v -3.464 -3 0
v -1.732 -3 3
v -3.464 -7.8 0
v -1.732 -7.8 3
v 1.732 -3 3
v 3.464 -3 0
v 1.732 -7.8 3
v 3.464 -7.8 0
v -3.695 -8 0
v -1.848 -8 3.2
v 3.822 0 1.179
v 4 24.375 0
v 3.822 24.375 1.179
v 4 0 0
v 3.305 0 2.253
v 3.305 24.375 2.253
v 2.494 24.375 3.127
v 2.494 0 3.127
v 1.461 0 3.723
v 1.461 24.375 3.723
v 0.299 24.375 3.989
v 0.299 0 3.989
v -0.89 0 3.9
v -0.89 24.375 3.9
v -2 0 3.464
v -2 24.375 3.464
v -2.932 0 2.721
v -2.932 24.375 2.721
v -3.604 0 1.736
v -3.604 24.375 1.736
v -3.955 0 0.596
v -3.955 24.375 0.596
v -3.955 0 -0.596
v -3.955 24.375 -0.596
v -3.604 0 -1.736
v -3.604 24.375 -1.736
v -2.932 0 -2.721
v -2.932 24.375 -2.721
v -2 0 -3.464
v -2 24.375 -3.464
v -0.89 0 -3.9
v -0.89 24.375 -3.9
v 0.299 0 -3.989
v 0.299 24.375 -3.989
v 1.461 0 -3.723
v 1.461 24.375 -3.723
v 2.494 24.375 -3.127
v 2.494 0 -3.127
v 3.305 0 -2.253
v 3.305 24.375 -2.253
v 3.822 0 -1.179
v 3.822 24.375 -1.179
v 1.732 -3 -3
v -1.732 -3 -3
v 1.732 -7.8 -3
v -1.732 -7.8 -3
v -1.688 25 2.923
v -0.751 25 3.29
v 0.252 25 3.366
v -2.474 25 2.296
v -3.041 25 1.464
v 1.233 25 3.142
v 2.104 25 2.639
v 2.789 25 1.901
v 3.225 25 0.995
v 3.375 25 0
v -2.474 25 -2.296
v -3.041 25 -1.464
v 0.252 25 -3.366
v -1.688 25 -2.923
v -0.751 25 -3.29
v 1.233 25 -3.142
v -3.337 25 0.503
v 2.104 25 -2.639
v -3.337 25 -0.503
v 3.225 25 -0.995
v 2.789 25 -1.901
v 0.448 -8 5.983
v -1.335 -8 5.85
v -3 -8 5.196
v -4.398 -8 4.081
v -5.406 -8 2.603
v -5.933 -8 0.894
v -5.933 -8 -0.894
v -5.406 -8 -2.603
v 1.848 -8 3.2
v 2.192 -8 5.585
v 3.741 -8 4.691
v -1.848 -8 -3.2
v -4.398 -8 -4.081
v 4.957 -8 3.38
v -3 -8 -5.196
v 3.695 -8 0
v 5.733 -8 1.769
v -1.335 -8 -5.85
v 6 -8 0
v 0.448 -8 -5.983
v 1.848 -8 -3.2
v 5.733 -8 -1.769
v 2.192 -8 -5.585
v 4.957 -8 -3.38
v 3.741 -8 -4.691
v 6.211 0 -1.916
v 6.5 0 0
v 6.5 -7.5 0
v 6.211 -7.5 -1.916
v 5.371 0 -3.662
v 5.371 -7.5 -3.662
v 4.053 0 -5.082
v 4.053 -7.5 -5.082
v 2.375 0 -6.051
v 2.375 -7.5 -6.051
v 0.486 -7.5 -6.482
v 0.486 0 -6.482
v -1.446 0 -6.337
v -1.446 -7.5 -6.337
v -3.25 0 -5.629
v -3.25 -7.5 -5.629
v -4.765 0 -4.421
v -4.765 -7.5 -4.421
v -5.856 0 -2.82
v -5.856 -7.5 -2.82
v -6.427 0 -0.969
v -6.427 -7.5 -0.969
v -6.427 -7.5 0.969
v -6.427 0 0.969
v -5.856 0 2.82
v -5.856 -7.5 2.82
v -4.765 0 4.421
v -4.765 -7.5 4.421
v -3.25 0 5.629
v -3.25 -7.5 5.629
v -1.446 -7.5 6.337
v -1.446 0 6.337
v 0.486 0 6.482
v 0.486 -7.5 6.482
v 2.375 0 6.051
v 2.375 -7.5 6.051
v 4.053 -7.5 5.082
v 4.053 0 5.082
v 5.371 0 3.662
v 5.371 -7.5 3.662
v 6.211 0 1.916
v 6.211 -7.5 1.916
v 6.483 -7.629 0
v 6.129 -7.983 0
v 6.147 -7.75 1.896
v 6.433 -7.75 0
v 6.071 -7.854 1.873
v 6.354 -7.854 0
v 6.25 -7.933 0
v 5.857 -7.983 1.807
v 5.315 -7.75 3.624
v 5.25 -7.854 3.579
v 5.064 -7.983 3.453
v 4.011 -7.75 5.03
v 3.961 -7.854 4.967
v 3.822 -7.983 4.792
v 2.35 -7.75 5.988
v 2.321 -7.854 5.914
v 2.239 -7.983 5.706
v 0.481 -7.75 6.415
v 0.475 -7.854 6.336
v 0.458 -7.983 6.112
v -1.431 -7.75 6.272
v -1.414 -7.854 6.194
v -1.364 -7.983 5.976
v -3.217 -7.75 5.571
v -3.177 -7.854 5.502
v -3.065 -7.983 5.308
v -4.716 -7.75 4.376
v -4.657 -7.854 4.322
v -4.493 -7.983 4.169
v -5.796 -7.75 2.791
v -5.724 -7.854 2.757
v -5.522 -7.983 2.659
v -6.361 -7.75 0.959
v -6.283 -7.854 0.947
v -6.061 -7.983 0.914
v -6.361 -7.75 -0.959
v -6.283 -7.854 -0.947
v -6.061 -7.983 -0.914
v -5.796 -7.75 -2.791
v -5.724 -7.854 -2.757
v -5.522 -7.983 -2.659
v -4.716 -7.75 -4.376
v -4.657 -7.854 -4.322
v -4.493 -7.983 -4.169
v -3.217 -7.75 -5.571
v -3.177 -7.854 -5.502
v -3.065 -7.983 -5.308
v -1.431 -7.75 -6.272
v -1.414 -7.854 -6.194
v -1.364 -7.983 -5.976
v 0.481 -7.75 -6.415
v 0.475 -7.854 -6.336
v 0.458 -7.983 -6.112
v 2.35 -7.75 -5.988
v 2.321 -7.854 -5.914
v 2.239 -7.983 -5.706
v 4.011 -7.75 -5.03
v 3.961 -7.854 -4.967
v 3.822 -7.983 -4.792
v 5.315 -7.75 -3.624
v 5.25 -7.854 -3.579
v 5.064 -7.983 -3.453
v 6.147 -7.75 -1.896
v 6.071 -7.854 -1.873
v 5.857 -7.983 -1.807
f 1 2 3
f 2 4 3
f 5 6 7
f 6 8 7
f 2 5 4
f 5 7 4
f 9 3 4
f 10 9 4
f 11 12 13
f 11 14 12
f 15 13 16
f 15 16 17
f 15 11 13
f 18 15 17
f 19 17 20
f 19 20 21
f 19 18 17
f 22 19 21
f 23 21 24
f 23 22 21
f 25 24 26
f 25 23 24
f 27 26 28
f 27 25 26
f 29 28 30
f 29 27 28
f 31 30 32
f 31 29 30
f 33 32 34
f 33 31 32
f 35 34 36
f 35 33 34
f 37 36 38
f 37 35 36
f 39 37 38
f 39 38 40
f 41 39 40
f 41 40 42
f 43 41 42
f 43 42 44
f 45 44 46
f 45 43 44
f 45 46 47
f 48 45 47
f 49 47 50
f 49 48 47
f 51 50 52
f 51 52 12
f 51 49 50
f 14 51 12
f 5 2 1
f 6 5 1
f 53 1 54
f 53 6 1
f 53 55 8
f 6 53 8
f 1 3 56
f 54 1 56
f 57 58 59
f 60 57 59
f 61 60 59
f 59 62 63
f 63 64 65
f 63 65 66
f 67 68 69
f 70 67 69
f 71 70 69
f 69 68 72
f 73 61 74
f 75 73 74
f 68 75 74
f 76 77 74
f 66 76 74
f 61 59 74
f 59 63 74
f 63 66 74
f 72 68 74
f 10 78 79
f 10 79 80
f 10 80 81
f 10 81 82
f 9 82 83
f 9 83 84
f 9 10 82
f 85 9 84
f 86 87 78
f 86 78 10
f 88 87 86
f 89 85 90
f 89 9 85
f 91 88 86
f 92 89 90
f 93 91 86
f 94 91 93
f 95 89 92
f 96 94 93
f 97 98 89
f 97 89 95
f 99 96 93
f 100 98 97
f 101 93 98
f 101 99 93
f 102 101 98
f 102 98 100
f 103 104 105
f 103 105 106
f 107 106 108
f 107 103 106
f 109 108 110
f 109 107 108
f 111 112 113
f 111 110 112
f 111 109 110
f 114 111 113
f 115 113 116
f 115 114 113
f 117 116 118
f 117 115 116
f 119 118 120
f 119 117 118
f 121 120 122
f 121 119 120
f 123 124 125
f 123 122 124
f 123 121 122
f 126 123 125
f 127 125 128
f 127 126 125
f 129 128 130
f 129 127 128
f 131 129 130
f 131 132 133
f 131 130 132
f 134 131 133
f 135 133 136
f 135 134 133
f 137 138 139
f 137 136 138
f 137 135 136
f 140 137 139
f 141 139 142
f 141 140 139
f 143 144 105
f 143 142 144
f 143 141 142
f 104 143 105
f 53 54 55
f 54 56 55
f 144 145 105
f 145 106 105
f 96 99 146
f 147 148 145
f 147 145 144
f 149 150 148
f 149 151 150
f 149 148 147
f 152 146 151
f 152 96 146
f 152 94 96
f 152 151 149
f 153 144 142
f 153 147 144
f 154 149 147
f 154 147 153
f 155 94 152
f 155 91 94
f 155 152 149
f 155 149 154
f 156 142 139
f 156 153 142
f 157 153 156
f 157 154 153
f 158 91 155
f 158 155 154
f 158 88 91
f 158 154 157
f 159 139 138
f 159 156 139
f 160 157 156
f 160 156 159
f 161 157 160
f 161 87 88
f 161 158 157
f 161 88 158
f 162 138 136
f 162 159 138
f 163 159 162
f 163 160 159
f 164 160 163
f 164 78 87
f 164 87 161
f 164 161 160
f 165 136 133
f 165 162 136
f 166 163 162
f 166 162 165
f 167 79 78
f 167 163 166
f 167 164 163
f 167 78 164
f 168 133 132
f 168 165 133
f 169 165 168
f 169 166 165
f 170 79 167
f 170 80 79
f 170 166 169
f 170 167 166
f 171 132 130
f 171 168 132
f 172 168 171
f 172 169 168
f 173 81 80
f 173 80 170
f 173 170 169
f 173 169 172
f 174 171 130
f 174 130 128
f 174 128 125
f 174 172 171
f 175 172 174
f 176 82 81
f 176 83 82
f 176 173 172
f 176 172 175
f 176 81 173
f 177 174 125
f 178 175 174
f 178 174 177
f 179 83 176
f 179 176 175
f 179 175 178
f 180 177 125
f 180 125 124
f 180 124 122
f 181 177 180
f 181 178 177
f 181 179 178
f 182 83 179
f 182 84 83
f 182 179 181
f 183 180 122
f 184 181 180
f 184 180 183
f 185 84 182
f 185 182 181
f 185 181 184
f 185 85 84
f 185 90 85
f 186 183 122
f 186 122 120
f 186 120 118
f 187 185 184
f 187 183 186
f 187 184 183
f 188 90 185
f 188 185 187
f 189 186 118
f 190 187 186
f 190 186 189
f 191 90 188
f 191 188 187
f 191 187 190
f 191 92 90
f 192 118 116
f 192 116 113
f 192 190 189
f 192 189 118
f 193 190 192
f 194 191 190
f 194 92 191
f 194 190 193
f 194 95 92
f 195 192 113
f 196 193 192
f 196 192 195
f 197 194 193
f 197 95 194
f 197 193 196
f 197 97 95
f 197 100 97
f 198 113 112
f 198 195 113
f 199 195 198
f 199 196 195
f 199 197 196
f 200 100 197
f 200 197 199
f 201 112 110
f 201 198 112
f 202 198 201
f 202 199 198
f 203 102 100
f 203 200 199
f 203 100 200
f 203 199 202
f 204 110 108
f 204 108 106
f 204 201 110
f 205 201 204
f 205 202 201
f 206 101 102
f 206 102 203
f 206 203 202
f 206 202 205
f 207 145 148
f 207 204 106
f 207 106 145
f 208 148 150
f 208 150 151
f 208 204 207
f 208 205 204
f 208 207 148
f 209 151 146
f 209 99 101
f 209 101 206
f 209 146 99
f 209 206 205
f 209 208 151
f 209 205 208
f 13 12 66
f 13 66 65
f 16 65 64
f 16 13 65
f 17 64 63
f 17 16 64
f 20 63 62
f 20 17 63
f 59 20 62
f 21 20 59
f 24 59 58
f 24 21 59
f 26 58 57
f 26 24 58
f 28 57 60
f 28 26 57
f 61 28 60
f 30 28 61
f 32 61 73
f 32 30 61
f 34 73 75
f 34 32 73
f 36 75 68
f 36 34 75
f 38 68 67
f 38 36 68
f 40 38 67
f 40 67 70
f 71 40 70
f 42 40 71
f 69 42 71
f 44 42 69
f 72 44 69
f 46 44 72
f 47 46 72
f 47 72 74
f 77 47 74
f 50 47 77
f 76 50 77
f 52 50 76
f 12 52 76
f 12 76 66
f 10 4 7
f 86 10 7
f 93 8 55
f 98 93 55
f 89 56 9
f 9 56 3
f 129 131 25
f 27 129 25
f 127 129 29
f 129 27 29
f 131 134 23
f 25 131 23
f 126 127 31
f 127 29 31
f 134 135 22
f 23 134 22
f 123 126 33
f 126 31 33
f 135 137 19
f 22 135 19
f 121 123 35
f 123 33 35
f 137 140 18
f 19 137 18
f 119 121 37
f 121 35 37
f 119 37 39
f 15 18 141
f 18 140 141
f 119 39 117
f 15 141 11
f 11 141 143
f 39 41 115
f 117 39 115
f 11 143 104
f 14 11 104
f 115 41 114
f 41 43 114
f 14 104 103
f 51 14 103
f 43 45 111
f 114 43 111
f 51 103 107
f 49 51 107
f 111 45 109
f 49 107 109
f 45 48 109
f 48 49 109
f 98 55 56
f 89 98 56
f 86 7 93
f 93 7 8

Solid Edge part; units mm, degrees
sketch "Sketch1" plane through (0, 0, 0) normal (0, -1, 0) x (1, 0, 0)
  circle A0 centre (0, 0) radius 4
  dimension "D1" = 8
extrude "Protrusion1" add sketch "Sketch1" against normal blind 25
sketch "Sketch2" plane through (0, 0, 0) normal (0, -1, 0) x (1, 0, 0)
  circle A0 centre (0, 0) radius 6.5
extrude "Protrusion2" add sketch "Sketch2" along normal blind 8
sketch "Sketch3" plane through (0, -8, 0) normal (0, -1, 0) x (1, 0, 0)
  line L0 (-1.7321, -3) -> (1.7321, -3)
  line L1 (1.7321, -3) -> (3.4641, 0)
  line L2 (3.4641, 0) -> (1.7321, 3)
  line L3 (1.7321, 3) -> (-1.7321, 3)
  line L4 (-1.7321, 3) -> (-3.4641, 0)
  line L5 (-3.4641, 0) -> (-1.7321, -3)
extrude "Cutout1" cut sketch "Sketch3" against normal blind 5
fillet "Round1" radius 0.5 1 edges at (-6.5, -8, 0)
chamfer "Chamfer1" distance 0.625 angle 45 1 edges at (-4, 25, 0)
chamfer "Chamfer2" distance 0.2 angle 45 6 edges at (0, -8, 3) (-2.5981, -8, 1.5) (-2.5981, -8, -1.5) (0, -8, -3) (2.5981, -8, -1.5) (2.5981, -8, 1.5)
cosmetic_thread "Thread1" size "Tr 8 x 2"
properties part number "16" material "Stainless steel"
